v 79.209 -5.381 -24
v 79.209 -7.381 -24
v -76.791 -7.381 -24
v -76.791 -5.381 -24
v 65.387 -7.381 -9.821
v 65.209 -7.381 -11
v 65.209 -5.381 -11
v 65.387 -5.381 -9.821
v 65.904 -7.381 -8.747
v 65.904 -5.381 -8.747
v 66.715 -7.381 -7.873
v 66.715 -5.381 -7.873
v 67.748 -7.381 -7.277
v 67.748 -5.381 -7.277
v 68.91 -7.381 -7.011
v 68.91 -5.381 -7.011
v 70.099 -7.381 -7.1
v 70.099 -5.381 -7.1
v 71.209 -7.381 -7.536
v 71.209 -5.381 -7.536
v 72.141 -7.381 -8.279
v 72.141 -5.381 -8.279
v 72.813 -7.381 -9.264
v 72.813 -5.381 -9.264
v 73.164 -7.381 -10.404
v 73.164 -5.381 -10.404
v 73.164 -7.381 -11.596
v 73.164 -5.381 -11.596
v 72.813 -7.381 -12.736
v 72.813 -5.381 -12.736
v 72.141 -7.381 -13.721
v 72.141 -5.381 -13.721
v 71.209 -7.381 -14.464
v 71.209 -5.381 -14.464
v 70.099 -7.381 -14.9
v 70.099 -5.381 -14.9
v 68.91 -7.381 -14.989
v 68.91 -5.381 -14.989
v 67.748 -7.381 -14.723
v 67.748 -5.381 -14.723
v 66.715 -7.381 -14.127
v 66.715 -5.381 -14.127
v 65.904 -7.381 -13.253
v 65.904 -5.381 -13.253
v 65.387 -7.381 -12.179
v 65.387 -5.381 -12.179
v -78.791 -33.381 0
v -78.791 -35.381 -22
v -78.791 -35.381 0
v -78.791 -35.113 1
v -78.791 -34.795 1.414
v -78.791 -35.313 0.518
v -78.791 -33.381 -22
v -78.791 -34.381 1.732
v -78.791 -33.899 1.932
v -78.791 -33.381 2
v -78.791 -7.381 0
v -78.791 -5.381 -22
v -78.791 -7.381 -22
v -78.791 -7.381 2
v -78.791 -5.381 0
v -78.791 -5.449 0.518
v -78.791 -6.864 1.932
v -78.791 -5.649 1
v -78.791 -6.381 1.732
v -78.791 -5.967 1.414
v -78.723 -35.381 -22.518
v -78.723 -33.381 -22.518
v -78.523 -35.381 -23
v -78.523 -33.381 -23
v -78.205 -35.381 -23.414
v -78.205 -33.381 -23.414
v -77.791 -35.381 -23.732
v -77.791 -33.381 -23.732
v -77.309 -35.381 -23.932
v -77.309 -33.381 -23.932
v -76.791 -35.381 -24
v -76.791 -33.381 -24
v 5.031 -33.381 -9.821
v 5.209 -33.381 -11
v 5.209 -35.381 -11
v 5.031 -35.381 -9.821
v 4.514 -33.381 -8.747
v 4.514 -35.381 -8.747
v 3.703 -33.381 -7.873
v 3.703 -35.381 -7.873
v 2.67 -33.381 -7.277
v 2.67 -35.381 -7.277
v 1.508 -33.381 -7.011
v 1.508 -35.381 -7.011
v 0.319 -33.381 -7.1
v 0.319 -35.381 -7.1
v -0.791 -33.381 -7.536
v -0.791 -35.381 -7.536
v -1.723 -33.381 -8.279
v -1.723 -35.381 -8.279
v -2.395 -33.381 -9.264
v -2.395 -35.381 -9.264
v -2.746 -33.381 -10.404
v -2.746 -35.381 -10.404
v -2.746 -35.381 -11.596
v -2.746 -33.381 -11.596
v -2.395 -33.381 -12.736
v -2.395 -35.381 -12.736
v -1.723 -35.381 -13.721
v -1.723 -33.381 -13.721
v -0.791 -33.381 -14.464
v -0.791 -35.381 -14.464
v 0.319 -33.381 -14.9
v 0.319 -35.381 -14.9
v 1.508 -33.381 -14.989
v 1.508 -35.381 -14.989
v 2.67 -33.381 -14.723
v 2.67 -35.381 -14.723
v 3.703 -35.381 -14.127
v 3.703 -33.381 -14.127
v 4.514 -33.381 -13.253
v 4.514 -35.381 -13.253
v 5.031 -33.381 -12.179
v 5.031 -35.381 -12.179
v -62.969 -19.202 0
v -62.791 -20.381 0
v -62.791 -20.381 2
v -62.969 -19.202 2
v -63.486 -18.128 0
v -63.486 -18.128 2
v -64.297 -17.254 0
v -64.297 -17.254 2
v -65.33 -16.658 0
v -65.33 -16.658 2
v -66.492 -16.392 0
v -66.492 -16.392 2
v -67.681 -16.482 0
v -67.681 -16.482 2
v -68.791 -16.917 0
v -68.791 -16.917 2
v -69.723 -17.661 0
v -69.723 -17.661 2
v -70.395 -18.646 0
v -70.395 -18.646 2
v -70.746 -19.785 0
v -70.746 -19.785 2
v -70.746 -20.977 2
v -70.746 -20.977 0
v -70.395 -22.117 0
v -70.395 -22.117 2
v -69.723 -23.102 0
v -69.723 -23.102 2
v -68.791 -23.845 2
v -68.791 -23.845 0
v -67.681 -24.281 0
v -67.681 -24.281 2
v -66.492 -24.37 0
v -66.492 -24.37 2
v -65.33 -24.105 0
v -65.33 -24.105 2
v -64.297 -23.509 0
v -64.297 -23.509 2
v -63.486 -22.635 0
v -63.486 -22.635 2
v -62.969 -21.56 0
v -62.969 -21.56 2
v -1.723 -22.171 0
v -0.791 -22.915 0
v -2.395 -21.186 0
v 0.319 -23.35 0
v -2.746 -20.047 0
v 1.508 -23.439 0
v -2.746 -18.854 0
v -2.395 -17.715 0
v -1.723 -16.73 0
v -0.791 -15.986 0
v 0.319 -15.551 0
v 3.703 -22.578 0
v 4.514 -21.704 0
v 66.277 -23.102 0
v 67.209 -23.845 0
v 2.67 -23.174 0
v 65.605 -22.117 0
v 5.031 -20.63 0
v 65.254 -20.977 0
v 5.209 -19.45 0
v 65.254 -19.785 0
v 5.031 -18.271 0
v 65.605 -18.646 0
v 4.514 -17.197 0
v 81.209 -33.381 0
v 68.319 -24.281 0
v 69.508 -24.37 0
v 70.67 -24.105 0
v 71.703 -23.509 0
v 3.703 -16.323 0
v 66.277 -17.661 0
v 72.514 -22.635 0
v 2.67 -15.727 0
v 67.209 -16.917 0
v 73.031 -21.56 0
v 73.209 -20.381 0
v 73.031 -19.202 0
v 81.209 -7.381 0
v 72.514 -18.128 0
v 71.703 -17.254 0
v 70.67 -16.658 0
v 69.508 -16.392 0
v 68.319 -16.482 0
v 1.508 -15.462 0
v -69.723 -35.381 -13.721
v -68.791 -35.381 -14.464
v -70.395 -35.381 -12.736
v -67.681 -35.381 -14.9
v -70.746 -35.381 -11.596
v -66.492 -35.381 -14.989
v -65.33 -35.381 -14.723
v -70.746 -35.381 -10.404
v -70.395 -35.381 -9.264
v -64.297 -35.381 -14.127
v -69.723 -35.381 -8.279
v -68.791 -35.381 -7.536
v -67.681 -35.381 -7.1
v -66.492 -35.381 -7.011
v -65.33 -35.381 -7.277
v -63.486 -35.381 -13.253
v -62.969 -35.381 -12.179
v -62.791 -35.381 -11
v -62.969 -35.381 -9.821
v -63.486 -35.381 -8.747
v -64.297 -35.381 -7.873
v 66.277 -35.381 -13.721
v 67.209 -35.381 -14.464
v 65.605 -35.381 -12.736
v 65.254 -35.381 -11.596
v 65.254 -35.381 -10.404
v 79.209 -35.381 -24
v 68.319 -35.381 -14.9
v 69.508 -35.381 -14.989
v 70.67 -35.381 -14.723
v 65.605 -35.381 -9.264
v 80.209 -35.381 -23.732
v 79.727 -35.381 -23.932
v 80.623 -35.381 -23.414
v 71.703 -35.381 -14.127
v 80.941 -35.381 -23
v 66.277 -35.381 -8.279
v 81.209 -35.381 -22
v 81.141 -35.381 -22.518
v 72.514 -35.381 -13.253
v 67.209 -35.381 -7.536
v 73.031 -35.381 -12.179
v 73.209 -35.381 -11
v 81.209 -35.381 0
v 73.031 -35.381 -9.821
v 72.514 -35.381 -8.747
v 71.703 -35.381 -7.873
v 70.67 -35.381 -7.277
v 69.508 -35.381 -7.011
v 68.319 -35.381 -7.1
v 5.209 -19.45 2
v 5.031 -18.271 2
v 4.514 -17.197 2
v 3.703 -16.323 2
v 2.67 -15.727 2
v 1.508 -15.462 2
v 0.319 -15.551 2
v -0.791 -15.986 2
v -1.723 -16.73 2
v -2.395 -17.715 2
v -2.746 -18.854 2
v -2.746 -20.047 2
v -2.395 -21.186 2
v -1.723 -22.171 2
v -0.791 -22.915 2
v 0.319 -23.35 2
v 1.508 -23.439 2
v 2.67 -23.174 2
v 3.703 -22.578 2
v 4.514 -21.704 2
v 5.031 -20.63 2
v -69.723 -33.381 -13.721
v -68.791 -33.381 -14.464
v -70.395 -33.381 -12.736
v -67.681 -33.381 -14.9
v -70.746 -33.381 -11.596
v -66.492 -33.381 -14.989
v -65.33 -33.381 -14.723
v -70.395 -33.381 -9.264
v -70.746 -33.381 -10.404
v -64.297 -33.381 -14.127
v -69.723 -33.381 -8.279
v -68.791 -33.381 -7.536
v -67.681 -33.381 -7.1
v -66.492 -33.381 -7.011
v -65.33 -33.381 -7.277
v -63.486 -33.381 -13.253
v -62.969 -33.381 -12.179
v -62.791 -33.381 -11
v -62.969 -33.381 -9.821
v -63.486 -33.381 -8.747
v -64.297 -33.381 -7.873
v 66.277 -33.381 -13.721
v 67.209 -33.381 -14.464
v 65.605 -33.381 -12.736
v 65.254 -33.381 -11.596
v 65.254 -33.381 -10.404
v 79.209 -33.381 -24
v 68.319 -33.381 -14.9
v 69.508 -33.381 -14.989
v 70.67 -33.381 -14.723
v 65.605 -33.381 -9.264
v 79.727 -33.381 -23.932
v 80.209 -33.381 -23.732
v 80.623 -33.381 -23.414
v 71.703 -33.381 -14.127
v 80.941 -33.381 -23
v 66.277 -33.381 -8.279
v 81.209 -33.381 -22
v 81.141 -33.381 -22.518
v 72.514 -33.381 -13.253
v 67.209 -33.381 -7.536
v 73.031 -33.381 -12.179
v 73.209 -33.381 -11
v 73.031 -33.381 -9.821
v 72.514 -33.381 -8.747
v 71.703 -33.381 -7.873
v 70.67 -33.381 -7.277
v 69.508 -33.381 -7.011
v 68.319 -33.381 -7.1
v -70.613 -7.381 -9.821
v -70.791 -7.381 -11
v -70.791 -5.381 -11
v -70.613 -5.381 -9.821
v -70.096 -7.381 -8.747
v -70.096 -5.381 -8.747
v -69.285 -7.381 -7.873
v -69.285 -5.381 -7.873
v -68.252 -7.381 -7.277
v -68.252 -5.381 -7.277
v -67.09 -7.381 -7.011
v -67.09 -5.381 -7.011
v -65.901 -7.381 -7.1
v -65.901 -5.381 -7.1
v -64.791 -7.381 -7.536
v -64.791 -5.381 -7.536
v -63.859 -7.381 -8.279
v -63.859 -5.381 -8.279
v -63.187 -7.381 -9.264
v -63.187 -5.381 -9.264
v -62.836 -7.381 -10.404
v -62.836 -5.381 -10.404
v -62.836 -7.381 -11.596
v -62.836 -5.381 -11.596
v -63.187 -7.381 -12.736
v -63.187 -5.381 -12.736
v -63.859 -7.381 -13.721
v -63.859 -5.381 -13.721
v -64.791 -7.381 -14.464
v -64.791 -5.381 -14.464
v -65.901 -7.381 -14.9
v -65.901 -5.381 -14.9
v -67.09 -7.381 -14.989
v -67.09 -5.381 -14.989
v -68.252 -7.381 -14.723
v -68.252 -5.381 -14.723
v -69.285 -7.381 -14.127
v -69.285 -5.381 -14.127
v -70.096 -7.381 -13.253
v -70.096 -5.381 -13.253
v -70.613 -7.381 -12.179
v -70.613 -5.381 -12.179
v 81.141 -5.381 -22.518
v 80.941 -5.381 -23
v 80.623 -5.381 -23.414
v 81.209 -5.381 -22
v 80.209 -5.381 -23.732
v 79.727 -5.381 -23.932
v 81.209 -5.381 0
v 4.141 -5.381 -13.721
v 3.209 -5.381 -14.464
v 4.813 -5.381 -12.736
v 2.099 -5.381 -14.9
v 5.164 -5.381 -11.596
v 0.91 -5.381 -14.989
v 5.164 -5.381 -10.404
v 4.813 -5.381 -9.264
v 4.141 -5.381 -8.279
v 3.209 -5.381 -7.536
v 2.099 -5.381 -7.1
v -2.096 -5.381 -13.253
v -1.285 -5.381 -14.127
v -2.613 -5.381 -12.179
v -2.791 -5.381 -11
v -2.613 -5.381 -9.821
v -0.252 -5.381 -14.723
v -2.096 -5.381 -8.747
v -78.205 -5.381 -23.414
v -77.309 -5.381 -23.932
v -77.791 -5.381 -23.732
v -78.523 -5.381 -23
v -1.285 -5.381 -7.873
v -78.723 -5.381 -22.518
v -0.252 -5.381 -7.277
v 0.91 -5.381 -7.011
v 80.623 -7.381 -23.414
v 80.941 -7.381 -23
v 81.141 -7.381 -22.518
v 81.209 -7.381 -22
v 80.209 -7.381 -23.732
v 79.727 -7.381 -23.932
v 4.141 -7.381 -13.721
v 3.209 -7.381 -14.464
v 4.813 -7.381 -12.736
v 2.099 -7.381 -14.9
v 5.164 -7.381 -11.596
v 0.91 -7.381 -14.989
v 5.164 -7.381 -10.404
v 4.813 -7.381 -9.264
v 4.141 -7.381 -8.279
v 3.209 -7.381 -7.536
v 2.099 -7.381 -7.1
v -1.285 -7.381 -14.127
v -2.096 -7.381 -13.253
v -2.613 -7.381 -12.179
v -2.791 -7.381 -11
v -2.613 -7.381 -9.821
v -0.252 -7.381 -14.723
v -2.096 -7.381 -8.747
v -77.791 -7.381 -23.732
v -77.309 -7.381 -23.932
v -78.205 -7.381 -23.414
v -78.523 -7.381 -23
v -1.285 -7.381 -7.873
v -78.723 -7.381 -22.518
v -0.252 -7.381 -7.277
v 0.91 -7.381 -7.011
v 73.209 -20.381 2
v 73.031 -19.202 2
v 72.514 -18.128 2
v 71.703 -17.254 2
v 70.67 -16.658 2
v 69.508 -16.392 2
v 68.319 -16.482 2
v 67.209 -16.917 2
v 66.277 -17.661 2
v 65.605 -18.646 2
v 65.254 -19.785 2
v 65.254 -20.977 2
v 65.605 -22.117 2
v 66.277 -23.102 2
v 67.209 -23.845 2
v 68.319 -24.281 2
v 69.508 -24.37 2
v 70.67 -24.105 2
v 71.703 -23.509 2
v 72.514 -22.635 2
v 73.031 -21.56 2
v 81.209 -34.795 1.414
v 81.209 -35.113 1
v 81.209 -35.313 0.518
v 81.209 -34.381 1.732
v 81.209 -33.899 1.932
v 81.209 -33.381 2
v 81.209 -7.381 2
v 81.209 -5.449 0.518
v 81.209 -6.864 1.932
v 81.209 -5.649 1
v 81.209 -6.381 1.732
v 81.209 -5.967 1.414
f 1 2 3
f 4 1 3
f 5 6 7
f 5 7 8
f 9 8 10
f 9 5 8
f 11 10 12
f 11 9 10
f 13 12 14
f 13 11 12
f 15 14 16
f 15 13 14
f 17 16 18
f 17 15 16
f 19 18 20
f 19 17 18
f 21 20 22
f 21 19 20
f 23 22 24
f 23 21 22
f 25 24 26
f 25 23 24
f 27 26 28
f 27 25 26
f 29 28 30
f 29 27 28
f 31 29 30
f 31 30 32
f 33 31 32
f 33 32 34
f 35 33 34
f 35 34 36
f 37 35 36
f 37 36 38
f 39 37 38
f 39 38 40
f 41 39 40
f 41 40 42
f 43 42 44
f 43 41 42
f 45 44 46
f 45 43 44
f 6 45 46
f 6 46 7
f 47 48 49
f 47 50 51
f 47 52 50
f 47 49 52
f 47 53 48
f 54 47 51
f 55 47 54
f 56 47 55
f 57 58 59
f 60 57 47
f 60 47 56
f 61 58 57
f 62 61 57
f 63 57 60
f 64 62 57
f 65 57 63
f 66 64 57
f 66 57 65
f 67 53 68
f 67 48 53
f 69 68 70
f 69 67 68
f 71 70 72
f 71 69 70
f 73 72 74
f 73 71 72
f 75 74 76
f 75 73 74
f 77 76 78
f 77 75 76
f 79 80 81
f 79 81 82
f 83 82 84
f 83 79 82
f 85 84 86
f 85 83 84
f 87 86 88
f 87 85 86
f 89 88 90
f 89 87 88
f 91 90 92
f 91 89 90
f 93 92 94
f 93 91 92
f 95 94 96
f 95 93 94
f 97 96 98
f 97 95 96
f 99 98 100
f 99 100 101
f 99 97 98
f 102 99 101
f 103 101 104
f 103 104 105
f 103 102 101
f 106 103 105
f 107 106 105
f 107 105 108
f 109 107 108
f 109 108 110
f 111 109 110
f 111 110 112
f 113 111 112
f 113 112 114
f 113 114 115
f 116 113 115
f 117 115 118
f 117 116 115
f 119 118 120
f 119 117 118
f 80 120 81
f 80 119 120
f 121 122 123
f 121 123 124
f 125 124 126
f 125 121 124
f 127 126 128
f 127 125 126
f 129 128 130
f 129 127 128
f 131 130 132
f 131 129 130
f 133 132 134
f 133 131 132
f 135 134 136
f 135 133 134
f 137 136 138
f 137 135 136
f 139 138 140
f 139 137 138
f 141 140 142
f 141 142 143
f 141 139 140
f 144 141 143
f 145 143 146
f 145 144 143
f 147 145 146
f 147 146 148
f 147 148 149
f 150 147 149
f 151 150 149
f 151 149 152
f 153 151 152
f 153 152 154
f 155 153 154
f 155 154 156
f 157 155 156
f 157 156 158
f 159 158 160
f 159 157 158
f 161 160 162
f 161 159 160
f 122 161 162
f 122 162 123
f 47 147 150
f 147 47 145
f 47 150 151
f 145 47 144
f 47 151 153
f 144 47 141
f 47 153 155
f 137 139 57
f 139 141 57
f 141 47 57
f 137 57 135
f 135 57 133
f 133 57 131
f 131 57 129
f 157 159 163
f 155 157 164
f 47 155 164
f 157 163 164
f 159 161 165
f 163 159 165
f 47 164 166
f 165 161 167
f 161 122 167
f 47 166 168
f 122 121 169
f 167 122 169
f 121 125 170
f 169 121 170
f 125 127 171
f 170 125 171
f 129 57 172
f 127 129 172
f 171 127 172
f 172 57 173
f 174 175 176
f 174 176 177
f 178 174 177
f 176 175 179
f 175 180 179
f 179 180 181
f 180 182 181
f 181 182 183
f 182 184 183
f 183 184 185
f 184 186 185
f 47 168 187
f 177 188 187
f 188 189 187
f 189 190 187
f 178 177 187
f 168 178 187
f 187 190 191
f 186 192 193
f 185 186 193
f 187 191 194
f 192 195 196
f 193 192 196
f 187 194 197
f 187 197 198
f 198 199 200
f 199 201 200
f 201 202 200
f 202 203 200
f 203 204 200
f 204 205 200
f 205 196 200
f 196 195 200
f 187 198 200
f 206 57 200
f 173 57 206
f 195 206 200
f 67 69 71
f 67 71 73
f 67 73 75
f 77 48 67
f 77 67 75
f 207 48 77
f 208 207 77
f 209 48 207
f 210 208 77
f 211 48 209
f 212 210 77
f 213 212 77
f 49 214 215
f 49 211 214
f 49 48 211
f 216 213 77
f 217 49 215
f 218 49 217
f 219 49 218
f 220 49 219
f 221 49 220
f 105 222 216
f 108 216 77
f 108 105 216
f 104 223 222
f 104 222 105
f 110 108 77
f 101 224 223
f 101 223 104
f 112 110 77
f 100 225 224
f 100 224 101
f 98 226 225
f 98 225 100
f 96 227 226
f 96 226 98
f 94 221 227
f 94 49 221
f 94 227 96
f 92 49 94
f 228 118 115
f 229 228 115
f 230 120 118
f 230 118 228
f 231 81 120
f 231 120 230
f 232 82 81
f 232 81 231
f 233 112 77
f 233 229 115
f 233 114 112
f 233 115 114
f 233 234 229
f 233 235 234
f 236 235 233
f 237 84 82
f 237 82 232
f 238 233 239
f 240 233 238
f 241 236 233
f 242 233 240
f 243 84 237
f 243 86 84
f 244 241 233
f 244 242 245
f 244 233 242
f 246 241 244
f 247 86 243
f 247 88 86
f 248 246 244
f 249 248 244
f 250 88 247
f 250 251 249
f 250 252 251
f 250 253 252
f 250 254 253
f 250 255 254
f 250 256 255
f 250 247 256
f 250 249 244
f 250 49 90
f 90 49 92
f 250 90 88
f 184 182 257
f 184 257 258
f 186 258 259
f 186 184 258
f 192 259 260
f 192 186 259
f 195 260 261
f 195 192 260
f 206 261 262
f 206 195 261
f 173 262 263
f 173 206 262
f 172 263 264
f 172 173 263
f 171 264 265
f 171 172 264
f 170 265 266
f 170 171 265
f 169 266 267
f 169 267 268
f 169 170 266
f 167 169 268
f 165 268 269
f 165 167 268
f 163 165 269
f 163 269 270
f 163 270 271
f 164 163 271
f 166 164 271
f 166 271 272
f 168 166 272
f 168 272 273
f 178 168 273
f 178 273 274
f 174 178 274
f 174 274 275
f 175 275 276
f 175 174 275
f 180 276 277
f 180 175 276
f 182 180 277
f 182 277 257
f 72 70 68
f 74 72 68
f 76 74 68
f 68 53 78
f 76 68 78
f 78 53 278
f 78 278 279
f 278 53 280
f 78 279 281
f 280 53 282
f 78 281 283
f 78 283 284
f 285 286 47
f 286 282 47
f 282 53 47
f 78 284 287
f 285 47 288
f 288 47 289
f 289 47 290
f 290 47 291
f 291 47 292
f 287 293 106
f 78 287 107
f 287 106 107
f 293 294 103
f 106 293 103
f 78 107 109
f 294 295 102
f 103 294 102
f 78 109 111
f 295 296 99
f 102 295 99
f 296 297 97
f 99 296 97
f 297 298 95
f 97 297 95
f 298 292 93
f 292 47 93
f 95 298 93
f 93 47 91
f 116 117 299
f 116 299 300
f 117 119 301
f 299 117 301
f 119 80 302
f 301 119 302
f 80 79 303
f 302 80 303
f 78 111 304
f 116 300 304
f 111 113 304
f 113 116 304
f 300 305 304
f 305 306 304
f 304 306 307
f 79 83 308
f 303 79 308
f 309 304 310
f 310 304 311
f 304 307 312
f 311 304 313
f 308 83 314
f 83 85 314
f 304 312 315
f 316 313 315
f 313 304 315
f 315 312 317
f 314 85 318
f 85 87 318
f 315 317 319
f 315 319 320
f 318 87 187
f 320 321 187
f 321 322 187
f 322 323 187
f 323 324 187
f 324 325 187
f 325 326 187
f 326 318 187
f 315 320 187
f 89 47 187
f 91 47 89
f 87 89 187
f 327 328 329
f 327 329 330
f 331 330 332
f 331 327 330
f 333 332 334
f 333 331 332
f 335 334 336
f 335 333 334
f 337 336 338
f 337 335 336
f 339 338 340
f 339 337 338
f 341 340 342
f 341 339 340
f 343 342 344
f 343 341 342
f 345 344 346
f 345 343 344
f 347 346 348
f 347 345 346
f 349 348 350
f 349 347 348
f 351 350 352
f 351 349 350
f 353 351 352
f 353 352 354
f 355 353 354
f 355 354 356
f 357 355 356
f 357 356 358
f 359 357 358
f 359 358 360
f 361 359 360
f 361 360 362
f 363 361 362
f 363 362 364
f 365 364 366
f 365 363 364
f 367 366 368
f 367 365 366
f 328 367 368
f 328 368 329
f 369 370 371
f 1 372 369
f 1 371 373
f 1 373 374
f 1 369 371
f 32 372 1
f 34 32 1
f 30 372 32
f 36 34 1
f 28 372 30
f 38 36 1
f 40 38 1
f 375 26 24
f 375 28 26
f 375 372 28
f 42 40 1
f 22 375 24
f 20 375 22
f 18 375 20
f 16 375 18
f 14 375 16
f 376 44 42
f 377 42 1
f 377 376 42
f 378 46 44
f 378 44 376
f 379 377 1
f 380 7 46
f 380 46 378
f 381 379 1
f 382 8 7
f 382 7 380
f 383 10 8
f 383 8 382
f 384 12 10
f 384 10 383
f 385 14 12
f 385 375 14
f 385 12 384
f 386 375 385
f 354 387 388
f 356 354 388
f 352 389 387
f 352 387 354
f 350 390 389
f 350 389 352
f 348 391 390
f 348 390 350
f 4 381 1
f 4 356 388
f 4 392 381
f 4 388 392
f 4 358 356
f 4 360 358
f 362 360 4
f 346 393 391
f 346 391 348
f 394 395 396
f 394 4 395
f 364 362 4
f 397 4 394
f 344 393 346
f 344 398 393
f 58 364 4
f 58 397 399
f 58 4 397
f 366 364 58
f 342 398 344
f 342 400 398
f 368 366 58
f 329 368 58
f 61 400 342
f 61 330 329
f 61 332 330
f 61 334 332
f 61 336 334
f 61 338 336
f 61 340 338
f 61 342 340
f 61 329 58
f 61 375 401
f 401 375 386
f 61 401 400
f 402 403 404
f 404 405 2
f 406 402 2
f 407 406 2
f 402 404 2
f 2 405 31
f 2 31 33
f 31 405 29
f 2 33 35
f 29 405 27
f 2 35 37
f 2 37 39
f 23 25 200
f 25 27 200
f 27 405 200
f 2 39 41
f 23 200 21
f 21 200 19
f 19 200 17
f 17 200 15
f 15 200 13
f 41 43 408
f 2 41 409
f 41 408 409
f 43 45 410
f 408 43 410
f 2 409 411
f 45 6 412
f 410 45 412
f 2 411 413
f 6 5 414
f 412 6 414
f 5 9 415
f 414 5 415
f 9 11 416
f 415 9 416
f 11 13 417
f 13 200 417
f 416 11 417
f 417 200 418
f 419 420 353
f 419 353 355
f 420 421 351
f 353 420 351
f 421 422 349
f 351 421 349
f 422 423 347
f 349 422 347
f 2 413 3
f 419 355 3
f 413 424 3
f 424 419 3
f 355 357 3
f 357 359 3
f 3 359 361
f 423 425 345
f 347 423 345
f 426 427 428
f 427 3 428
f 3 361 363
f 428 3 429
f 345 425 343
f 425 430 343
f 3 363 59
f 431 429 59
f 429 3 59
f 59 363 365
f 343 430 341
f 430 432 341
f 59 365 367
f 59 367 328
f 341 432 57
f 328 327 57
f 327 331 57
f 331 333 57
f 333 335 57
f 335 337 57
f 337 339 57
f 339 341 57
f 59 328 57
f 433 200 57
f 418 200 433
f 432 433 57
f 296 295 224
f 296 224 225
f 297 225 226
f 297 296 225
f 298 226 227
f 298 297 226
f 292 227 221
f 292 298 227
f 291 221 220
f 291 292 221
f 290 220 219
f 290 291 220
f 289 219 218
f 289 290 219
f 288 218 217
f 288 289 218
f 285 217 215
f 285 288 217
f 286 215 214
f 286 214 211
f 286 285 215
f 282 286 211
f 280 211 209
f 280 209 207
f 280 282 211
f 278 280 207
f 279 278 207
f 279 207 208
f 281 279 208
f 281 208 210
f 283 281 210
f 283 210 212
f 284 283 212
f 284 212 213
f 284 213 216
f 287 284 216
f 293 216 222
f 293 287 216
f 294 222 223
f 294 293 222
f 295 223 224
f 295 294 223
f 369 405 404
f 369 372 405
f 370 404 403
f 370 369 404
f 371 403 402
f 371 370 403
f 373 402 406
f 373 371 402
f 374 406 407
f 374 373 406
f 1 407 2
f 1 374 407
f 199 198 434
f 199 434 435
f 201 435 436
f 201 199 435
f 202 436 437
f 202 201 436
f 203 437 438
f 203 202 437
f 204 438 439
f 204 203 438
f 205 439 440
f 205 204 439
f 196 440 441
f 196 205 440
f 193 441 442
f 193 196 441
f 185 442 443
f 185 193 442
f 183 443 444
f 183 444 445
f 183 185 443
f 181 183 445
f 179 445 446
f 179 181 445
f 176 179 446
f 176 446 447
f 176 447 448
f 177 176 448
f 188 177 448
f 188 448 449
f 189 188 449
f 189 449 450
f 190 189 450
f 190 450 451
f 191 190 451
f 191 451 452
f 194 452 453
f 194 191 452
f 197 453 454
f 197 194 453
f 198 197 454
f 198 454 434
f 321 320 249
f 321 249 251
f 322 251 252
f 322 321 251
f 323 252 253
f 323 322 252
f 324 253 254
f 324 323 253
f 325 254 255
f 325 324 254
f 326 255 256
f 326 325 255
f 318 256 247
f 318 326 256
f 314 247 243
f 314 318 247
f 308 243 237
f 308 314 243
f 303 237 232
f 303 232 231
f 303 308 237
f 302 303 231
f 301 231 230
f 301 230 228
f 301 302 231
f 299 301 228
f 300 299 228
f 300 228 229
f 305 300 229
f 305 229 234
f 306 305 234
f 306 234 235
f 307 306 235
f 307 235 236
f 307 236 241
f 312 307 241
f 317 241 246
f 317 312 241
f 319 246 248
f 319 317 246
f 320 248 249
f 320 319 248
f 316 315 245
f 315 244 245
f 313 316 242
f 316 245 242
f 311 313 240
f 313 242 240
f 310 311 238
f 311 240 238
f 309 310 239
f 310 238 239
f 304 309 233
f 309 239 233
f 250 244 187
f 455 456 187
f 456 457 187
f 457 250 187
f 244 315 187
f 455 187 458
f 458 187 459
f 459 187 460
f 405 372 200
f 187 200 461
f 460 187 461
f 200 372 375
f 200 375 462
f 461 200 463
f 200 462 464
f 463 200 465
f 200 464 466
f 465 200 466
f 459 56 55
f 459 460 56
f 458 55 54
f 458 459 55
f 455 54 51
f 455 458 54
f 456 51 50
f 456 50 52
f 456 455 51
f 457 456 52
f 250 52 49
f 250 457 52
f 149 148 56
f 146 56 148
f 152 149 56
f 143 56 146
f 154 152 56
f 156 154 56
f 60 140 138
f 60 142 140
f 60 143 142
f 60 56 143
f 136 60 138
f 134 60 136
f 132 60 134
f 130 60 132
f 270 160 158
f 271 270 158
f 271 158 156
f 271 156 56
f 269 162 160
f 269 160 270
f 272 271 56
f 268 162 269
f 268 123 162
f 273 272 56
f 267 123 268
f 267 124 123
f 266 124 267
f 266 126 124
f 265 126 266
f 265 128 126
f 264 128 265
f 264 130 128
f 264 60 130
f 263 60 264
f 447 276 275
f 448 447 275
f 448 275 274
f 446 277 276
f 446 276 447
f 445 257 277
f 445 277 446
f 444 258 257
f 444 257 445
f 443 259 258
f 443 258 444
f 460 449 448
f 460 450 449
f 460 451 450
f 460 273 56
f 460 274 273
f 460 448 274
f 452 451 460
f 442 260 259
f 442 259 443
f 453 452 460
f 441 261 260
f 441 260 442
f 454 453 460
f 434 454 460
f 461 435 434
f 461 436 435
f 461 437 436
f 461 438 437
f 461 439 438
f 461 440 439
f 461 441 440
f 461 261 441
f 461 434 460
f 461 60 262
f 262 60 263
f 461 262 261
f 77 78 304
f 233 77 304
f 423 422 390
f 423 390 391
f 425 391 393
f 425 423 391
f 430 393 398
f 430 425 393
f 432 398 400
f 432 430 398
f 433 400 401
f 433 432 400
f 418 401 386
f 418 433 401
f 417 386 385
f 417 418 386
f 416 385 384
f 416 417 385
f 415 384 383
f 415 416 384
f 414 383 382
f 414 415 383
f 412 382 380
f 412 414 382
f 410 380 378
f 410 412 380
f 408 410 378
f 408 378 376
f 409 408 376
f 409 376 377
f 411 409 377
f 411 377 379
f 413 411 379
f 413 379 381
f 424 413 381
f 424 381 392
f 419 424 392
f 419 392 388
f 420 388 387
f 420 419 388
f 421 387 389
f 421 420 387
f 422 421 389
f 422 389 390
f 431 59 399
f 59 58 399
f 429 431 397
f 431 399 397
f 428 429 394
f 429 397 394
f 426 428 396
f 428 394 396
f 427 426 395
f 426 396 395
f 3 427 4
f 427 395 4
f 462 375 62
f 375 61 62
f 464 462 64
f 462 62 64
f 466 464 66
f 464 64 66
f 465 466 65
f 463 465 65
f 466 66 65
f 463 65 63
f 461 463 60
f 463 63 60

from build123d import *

# Parameters (mm, degrees)
F0_W     = 160
F0_H     = 26
F0_R     = 4
F1_DEPTH = 2
F4_W     = 160
F4_H     = 26
F4_R     = 4
F7_DEPTH = 2
F6_W     = 160
F6_H     = 26
F6_R     = 4
F8_DEPTH = 2
F9_R     = 2


with BuildPart() as f1:
    # F0 (on Top) → F1 (new body)
    with BuildSketch(Plane.XY):
        with Locations((1.2090578675, -20.3812407514)):
            Rectangle(F0_W, F0_H)
        with Locations((-66.7909421325, -20.3812407514)):
            Circle(F0_R, mode=Mode.SUBTRACT)
        with Locations((1.2090578675, -19.4504977352)):
            Circle(F0_R, mode=Mode.SUBTRACT)
        with Locations((69.2090578675, -20.3812407514)):
            Circle(F0_R, mode=Mode.SUBTRACT)
    extrude(amount=F1_DEPTH)

    # F4 (on offset) → F7 (join)
    with BuildSketch(Plane(origin=(0, -7.3812407514, 0), x_dir=(-1, 0, 0), z_dir=(0, 1, 0))):
        with Locations((-1.2090578675, -11)):
            Rectangle(F4_W, F4_H)
        with Locations((-69.2090578675, -11)):
            Circle(F4_R, mode=Mode.SUBTRACT)
        with Locations((-1.2090578675, -11)):
            Circle(F4_R, mode=Mode.SUBTRACT)
        with Locations((66.7909421325, -11)):
            Circle(F4_R, mode=Mode.SUBTRACT)
    extrude(amount=F7_DEPTH)

    # F6 (on offset) → F8 (join)
    with BuildSketch(Plane.XZ.offset(33.3812407514)):
        with Locations((1.2090578675, -11)):
            Rectangle(F6_W, F6_H)
        with Locations((-66.7909421325, -11)):
            Circle(F6_R, mode=Mode.SUBTRACT)
        with Locations((1.2090578675, -11)):
            Circle(F6_R, mode=Mode.SUBTRACT)
        with Locations((69.2090578675, -11)):
            Circle(F6_R, mode=Mode.SUBTRACT)
    extrude(amount=F8_DEPTH)

    # F9
    f9_edges = [f1.edges().sort_by_distance(p)[0] for p in [
        (1.209058, -5.381241, 2),
        (1.209058, -35.381241, 2),
        (-78.790942, -34.381241, -24),
        (-78.790942, -6.381241, -24),
        (81.209058, -34.381241, -24),
        (81.209058, -6.381241, -24),
    ]]
    fillet(f9_edges, radius=F9_R)


solid = f1.part
